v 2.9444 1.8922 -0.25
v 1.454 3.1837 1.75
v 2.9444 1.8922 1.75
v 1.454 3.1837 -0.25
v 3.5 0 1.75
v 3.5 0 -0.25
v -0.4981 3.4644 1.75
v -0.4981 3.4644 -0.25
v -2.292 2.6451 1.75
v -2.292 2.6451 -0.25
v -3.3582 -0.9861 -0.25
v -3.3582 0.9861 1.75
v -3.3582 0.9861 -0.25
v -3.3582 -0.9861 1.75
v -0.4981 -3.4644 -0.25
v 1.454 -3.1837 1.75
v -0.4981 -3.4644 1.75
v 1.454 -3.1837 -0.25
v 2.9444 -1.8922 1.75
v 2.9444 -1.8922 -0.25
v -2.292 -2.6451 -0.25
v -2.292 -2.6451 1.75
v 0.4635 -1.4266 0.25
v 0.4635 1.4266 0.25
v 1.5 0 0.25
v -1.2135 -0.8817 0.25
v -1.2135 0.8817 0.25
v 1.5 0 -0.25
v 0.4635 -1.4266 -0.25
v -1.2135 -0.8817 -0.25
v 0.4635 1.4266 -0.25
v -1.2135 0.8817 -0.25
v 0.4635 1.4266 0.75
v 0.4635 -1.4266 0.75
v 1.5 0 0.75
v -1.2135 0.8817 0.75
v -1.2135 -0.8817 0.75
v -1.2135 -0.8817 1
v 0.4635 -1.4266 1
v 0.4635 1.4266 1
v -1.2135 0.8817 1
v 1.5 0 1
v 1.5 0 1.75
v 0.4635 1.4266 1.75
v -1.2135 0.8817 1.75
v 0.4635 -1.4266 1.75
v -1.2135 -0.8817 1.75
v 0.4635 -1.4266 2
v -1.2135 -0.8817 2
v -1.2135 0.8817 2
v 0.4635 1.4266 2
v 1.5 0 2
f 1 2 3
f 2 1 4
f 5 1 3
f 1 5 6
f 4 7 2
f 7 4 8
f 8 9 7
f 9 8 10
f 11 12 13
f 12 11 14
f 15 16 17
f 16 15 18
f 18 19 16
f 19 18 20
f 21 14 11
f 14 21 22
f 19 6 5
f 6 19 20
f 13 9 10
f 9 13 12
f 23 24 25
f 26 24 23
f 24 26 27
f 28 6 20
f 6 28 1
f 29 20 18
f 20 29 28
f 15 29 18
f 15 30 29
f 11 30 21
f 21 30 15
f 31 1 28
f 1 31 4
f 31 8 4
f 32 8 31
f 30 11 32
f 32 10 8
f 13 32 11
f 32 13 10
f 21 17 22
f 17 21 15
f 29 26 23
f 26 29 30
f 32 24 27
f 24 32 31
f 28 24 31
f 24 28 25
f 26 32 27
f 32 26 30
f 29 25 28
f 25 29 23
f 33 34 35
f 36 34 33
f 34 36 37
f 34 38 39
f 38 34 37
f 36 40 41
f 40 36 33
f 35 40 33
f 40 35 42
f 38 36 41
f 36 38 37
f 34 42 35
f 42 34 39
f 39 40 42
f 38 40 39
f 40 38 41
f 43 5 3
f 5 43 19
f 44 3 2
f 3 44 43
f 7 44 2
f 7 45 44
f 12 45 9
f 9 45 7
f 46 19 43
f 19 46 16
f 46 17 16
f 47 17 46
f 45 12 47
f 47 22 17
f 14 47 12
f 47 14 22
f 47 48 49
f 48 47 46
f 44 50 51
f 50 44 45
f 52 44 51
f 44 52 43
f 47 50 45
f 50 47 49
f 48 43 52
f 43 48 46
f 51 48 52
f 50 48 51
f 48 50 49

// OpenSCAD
// Parameters
inner_diameter_mm = 3; //[1.5:6:0.1]
outer_diameter_mm = 7; //[3.5:14:0.1]
thickness_mm = 0.5; //[0.25:1:0.05]
eps_mm = 0.2; //[0.05:0.5:0.05]

// Washer - basic geometry
module washer_body() {
  color("Silver") difference() {
    cylinder(r=outer_diameter_mm/2, h=thickness_mm, center=true);
    cylinder(r=inner_diameter_mm/2, h=thickness_mm + eps_mm, center=true);
  }
}

// Round Grommet Top - detailed geometry
module round_grommet_top() {
  color("DimGray") {
    cylinder(r=outer_diameter_mm/2, h=thickness_mm, center=true);
  }
}

// Round Grommet Assembly - detailed geometry
module round_grommet_assembly() {
  color("DimGray") {
    union() {
      washer_body();
      round_grommet_top();
    }
  }
}

// Nut And Washer - detailed geometry
module nut_and_washer() {
  color("Black") {
    union() {
      washer_body();
      translate([0, 0, thickness_mm/2]) cylinder(r=outer_diameter_mm/2, h=thickness_mm, center=true);
    }
  }
}

// Screw And Washer - detailed geometry
module screw_and_washer() {
  color("Black") {
    union() {
      washer_body();
      translate([0, 0, thickness_mm/2]) cylinder(r=inner_diameter_mm/2, h=thickness_mm, center=true);
    }
  }
}

// Assembly - combines all parts
module assembly() {
  translate([0, 0, 0]) washer_body();
  translate([0, 0, thickness_mm]) round_grommet_top();
  translate([0, 0, thickness_mm * 2]) nut_and_washer();
  translate([0, 0, thickness_mm * 3]) screw_and_washer();
}

assembly();
